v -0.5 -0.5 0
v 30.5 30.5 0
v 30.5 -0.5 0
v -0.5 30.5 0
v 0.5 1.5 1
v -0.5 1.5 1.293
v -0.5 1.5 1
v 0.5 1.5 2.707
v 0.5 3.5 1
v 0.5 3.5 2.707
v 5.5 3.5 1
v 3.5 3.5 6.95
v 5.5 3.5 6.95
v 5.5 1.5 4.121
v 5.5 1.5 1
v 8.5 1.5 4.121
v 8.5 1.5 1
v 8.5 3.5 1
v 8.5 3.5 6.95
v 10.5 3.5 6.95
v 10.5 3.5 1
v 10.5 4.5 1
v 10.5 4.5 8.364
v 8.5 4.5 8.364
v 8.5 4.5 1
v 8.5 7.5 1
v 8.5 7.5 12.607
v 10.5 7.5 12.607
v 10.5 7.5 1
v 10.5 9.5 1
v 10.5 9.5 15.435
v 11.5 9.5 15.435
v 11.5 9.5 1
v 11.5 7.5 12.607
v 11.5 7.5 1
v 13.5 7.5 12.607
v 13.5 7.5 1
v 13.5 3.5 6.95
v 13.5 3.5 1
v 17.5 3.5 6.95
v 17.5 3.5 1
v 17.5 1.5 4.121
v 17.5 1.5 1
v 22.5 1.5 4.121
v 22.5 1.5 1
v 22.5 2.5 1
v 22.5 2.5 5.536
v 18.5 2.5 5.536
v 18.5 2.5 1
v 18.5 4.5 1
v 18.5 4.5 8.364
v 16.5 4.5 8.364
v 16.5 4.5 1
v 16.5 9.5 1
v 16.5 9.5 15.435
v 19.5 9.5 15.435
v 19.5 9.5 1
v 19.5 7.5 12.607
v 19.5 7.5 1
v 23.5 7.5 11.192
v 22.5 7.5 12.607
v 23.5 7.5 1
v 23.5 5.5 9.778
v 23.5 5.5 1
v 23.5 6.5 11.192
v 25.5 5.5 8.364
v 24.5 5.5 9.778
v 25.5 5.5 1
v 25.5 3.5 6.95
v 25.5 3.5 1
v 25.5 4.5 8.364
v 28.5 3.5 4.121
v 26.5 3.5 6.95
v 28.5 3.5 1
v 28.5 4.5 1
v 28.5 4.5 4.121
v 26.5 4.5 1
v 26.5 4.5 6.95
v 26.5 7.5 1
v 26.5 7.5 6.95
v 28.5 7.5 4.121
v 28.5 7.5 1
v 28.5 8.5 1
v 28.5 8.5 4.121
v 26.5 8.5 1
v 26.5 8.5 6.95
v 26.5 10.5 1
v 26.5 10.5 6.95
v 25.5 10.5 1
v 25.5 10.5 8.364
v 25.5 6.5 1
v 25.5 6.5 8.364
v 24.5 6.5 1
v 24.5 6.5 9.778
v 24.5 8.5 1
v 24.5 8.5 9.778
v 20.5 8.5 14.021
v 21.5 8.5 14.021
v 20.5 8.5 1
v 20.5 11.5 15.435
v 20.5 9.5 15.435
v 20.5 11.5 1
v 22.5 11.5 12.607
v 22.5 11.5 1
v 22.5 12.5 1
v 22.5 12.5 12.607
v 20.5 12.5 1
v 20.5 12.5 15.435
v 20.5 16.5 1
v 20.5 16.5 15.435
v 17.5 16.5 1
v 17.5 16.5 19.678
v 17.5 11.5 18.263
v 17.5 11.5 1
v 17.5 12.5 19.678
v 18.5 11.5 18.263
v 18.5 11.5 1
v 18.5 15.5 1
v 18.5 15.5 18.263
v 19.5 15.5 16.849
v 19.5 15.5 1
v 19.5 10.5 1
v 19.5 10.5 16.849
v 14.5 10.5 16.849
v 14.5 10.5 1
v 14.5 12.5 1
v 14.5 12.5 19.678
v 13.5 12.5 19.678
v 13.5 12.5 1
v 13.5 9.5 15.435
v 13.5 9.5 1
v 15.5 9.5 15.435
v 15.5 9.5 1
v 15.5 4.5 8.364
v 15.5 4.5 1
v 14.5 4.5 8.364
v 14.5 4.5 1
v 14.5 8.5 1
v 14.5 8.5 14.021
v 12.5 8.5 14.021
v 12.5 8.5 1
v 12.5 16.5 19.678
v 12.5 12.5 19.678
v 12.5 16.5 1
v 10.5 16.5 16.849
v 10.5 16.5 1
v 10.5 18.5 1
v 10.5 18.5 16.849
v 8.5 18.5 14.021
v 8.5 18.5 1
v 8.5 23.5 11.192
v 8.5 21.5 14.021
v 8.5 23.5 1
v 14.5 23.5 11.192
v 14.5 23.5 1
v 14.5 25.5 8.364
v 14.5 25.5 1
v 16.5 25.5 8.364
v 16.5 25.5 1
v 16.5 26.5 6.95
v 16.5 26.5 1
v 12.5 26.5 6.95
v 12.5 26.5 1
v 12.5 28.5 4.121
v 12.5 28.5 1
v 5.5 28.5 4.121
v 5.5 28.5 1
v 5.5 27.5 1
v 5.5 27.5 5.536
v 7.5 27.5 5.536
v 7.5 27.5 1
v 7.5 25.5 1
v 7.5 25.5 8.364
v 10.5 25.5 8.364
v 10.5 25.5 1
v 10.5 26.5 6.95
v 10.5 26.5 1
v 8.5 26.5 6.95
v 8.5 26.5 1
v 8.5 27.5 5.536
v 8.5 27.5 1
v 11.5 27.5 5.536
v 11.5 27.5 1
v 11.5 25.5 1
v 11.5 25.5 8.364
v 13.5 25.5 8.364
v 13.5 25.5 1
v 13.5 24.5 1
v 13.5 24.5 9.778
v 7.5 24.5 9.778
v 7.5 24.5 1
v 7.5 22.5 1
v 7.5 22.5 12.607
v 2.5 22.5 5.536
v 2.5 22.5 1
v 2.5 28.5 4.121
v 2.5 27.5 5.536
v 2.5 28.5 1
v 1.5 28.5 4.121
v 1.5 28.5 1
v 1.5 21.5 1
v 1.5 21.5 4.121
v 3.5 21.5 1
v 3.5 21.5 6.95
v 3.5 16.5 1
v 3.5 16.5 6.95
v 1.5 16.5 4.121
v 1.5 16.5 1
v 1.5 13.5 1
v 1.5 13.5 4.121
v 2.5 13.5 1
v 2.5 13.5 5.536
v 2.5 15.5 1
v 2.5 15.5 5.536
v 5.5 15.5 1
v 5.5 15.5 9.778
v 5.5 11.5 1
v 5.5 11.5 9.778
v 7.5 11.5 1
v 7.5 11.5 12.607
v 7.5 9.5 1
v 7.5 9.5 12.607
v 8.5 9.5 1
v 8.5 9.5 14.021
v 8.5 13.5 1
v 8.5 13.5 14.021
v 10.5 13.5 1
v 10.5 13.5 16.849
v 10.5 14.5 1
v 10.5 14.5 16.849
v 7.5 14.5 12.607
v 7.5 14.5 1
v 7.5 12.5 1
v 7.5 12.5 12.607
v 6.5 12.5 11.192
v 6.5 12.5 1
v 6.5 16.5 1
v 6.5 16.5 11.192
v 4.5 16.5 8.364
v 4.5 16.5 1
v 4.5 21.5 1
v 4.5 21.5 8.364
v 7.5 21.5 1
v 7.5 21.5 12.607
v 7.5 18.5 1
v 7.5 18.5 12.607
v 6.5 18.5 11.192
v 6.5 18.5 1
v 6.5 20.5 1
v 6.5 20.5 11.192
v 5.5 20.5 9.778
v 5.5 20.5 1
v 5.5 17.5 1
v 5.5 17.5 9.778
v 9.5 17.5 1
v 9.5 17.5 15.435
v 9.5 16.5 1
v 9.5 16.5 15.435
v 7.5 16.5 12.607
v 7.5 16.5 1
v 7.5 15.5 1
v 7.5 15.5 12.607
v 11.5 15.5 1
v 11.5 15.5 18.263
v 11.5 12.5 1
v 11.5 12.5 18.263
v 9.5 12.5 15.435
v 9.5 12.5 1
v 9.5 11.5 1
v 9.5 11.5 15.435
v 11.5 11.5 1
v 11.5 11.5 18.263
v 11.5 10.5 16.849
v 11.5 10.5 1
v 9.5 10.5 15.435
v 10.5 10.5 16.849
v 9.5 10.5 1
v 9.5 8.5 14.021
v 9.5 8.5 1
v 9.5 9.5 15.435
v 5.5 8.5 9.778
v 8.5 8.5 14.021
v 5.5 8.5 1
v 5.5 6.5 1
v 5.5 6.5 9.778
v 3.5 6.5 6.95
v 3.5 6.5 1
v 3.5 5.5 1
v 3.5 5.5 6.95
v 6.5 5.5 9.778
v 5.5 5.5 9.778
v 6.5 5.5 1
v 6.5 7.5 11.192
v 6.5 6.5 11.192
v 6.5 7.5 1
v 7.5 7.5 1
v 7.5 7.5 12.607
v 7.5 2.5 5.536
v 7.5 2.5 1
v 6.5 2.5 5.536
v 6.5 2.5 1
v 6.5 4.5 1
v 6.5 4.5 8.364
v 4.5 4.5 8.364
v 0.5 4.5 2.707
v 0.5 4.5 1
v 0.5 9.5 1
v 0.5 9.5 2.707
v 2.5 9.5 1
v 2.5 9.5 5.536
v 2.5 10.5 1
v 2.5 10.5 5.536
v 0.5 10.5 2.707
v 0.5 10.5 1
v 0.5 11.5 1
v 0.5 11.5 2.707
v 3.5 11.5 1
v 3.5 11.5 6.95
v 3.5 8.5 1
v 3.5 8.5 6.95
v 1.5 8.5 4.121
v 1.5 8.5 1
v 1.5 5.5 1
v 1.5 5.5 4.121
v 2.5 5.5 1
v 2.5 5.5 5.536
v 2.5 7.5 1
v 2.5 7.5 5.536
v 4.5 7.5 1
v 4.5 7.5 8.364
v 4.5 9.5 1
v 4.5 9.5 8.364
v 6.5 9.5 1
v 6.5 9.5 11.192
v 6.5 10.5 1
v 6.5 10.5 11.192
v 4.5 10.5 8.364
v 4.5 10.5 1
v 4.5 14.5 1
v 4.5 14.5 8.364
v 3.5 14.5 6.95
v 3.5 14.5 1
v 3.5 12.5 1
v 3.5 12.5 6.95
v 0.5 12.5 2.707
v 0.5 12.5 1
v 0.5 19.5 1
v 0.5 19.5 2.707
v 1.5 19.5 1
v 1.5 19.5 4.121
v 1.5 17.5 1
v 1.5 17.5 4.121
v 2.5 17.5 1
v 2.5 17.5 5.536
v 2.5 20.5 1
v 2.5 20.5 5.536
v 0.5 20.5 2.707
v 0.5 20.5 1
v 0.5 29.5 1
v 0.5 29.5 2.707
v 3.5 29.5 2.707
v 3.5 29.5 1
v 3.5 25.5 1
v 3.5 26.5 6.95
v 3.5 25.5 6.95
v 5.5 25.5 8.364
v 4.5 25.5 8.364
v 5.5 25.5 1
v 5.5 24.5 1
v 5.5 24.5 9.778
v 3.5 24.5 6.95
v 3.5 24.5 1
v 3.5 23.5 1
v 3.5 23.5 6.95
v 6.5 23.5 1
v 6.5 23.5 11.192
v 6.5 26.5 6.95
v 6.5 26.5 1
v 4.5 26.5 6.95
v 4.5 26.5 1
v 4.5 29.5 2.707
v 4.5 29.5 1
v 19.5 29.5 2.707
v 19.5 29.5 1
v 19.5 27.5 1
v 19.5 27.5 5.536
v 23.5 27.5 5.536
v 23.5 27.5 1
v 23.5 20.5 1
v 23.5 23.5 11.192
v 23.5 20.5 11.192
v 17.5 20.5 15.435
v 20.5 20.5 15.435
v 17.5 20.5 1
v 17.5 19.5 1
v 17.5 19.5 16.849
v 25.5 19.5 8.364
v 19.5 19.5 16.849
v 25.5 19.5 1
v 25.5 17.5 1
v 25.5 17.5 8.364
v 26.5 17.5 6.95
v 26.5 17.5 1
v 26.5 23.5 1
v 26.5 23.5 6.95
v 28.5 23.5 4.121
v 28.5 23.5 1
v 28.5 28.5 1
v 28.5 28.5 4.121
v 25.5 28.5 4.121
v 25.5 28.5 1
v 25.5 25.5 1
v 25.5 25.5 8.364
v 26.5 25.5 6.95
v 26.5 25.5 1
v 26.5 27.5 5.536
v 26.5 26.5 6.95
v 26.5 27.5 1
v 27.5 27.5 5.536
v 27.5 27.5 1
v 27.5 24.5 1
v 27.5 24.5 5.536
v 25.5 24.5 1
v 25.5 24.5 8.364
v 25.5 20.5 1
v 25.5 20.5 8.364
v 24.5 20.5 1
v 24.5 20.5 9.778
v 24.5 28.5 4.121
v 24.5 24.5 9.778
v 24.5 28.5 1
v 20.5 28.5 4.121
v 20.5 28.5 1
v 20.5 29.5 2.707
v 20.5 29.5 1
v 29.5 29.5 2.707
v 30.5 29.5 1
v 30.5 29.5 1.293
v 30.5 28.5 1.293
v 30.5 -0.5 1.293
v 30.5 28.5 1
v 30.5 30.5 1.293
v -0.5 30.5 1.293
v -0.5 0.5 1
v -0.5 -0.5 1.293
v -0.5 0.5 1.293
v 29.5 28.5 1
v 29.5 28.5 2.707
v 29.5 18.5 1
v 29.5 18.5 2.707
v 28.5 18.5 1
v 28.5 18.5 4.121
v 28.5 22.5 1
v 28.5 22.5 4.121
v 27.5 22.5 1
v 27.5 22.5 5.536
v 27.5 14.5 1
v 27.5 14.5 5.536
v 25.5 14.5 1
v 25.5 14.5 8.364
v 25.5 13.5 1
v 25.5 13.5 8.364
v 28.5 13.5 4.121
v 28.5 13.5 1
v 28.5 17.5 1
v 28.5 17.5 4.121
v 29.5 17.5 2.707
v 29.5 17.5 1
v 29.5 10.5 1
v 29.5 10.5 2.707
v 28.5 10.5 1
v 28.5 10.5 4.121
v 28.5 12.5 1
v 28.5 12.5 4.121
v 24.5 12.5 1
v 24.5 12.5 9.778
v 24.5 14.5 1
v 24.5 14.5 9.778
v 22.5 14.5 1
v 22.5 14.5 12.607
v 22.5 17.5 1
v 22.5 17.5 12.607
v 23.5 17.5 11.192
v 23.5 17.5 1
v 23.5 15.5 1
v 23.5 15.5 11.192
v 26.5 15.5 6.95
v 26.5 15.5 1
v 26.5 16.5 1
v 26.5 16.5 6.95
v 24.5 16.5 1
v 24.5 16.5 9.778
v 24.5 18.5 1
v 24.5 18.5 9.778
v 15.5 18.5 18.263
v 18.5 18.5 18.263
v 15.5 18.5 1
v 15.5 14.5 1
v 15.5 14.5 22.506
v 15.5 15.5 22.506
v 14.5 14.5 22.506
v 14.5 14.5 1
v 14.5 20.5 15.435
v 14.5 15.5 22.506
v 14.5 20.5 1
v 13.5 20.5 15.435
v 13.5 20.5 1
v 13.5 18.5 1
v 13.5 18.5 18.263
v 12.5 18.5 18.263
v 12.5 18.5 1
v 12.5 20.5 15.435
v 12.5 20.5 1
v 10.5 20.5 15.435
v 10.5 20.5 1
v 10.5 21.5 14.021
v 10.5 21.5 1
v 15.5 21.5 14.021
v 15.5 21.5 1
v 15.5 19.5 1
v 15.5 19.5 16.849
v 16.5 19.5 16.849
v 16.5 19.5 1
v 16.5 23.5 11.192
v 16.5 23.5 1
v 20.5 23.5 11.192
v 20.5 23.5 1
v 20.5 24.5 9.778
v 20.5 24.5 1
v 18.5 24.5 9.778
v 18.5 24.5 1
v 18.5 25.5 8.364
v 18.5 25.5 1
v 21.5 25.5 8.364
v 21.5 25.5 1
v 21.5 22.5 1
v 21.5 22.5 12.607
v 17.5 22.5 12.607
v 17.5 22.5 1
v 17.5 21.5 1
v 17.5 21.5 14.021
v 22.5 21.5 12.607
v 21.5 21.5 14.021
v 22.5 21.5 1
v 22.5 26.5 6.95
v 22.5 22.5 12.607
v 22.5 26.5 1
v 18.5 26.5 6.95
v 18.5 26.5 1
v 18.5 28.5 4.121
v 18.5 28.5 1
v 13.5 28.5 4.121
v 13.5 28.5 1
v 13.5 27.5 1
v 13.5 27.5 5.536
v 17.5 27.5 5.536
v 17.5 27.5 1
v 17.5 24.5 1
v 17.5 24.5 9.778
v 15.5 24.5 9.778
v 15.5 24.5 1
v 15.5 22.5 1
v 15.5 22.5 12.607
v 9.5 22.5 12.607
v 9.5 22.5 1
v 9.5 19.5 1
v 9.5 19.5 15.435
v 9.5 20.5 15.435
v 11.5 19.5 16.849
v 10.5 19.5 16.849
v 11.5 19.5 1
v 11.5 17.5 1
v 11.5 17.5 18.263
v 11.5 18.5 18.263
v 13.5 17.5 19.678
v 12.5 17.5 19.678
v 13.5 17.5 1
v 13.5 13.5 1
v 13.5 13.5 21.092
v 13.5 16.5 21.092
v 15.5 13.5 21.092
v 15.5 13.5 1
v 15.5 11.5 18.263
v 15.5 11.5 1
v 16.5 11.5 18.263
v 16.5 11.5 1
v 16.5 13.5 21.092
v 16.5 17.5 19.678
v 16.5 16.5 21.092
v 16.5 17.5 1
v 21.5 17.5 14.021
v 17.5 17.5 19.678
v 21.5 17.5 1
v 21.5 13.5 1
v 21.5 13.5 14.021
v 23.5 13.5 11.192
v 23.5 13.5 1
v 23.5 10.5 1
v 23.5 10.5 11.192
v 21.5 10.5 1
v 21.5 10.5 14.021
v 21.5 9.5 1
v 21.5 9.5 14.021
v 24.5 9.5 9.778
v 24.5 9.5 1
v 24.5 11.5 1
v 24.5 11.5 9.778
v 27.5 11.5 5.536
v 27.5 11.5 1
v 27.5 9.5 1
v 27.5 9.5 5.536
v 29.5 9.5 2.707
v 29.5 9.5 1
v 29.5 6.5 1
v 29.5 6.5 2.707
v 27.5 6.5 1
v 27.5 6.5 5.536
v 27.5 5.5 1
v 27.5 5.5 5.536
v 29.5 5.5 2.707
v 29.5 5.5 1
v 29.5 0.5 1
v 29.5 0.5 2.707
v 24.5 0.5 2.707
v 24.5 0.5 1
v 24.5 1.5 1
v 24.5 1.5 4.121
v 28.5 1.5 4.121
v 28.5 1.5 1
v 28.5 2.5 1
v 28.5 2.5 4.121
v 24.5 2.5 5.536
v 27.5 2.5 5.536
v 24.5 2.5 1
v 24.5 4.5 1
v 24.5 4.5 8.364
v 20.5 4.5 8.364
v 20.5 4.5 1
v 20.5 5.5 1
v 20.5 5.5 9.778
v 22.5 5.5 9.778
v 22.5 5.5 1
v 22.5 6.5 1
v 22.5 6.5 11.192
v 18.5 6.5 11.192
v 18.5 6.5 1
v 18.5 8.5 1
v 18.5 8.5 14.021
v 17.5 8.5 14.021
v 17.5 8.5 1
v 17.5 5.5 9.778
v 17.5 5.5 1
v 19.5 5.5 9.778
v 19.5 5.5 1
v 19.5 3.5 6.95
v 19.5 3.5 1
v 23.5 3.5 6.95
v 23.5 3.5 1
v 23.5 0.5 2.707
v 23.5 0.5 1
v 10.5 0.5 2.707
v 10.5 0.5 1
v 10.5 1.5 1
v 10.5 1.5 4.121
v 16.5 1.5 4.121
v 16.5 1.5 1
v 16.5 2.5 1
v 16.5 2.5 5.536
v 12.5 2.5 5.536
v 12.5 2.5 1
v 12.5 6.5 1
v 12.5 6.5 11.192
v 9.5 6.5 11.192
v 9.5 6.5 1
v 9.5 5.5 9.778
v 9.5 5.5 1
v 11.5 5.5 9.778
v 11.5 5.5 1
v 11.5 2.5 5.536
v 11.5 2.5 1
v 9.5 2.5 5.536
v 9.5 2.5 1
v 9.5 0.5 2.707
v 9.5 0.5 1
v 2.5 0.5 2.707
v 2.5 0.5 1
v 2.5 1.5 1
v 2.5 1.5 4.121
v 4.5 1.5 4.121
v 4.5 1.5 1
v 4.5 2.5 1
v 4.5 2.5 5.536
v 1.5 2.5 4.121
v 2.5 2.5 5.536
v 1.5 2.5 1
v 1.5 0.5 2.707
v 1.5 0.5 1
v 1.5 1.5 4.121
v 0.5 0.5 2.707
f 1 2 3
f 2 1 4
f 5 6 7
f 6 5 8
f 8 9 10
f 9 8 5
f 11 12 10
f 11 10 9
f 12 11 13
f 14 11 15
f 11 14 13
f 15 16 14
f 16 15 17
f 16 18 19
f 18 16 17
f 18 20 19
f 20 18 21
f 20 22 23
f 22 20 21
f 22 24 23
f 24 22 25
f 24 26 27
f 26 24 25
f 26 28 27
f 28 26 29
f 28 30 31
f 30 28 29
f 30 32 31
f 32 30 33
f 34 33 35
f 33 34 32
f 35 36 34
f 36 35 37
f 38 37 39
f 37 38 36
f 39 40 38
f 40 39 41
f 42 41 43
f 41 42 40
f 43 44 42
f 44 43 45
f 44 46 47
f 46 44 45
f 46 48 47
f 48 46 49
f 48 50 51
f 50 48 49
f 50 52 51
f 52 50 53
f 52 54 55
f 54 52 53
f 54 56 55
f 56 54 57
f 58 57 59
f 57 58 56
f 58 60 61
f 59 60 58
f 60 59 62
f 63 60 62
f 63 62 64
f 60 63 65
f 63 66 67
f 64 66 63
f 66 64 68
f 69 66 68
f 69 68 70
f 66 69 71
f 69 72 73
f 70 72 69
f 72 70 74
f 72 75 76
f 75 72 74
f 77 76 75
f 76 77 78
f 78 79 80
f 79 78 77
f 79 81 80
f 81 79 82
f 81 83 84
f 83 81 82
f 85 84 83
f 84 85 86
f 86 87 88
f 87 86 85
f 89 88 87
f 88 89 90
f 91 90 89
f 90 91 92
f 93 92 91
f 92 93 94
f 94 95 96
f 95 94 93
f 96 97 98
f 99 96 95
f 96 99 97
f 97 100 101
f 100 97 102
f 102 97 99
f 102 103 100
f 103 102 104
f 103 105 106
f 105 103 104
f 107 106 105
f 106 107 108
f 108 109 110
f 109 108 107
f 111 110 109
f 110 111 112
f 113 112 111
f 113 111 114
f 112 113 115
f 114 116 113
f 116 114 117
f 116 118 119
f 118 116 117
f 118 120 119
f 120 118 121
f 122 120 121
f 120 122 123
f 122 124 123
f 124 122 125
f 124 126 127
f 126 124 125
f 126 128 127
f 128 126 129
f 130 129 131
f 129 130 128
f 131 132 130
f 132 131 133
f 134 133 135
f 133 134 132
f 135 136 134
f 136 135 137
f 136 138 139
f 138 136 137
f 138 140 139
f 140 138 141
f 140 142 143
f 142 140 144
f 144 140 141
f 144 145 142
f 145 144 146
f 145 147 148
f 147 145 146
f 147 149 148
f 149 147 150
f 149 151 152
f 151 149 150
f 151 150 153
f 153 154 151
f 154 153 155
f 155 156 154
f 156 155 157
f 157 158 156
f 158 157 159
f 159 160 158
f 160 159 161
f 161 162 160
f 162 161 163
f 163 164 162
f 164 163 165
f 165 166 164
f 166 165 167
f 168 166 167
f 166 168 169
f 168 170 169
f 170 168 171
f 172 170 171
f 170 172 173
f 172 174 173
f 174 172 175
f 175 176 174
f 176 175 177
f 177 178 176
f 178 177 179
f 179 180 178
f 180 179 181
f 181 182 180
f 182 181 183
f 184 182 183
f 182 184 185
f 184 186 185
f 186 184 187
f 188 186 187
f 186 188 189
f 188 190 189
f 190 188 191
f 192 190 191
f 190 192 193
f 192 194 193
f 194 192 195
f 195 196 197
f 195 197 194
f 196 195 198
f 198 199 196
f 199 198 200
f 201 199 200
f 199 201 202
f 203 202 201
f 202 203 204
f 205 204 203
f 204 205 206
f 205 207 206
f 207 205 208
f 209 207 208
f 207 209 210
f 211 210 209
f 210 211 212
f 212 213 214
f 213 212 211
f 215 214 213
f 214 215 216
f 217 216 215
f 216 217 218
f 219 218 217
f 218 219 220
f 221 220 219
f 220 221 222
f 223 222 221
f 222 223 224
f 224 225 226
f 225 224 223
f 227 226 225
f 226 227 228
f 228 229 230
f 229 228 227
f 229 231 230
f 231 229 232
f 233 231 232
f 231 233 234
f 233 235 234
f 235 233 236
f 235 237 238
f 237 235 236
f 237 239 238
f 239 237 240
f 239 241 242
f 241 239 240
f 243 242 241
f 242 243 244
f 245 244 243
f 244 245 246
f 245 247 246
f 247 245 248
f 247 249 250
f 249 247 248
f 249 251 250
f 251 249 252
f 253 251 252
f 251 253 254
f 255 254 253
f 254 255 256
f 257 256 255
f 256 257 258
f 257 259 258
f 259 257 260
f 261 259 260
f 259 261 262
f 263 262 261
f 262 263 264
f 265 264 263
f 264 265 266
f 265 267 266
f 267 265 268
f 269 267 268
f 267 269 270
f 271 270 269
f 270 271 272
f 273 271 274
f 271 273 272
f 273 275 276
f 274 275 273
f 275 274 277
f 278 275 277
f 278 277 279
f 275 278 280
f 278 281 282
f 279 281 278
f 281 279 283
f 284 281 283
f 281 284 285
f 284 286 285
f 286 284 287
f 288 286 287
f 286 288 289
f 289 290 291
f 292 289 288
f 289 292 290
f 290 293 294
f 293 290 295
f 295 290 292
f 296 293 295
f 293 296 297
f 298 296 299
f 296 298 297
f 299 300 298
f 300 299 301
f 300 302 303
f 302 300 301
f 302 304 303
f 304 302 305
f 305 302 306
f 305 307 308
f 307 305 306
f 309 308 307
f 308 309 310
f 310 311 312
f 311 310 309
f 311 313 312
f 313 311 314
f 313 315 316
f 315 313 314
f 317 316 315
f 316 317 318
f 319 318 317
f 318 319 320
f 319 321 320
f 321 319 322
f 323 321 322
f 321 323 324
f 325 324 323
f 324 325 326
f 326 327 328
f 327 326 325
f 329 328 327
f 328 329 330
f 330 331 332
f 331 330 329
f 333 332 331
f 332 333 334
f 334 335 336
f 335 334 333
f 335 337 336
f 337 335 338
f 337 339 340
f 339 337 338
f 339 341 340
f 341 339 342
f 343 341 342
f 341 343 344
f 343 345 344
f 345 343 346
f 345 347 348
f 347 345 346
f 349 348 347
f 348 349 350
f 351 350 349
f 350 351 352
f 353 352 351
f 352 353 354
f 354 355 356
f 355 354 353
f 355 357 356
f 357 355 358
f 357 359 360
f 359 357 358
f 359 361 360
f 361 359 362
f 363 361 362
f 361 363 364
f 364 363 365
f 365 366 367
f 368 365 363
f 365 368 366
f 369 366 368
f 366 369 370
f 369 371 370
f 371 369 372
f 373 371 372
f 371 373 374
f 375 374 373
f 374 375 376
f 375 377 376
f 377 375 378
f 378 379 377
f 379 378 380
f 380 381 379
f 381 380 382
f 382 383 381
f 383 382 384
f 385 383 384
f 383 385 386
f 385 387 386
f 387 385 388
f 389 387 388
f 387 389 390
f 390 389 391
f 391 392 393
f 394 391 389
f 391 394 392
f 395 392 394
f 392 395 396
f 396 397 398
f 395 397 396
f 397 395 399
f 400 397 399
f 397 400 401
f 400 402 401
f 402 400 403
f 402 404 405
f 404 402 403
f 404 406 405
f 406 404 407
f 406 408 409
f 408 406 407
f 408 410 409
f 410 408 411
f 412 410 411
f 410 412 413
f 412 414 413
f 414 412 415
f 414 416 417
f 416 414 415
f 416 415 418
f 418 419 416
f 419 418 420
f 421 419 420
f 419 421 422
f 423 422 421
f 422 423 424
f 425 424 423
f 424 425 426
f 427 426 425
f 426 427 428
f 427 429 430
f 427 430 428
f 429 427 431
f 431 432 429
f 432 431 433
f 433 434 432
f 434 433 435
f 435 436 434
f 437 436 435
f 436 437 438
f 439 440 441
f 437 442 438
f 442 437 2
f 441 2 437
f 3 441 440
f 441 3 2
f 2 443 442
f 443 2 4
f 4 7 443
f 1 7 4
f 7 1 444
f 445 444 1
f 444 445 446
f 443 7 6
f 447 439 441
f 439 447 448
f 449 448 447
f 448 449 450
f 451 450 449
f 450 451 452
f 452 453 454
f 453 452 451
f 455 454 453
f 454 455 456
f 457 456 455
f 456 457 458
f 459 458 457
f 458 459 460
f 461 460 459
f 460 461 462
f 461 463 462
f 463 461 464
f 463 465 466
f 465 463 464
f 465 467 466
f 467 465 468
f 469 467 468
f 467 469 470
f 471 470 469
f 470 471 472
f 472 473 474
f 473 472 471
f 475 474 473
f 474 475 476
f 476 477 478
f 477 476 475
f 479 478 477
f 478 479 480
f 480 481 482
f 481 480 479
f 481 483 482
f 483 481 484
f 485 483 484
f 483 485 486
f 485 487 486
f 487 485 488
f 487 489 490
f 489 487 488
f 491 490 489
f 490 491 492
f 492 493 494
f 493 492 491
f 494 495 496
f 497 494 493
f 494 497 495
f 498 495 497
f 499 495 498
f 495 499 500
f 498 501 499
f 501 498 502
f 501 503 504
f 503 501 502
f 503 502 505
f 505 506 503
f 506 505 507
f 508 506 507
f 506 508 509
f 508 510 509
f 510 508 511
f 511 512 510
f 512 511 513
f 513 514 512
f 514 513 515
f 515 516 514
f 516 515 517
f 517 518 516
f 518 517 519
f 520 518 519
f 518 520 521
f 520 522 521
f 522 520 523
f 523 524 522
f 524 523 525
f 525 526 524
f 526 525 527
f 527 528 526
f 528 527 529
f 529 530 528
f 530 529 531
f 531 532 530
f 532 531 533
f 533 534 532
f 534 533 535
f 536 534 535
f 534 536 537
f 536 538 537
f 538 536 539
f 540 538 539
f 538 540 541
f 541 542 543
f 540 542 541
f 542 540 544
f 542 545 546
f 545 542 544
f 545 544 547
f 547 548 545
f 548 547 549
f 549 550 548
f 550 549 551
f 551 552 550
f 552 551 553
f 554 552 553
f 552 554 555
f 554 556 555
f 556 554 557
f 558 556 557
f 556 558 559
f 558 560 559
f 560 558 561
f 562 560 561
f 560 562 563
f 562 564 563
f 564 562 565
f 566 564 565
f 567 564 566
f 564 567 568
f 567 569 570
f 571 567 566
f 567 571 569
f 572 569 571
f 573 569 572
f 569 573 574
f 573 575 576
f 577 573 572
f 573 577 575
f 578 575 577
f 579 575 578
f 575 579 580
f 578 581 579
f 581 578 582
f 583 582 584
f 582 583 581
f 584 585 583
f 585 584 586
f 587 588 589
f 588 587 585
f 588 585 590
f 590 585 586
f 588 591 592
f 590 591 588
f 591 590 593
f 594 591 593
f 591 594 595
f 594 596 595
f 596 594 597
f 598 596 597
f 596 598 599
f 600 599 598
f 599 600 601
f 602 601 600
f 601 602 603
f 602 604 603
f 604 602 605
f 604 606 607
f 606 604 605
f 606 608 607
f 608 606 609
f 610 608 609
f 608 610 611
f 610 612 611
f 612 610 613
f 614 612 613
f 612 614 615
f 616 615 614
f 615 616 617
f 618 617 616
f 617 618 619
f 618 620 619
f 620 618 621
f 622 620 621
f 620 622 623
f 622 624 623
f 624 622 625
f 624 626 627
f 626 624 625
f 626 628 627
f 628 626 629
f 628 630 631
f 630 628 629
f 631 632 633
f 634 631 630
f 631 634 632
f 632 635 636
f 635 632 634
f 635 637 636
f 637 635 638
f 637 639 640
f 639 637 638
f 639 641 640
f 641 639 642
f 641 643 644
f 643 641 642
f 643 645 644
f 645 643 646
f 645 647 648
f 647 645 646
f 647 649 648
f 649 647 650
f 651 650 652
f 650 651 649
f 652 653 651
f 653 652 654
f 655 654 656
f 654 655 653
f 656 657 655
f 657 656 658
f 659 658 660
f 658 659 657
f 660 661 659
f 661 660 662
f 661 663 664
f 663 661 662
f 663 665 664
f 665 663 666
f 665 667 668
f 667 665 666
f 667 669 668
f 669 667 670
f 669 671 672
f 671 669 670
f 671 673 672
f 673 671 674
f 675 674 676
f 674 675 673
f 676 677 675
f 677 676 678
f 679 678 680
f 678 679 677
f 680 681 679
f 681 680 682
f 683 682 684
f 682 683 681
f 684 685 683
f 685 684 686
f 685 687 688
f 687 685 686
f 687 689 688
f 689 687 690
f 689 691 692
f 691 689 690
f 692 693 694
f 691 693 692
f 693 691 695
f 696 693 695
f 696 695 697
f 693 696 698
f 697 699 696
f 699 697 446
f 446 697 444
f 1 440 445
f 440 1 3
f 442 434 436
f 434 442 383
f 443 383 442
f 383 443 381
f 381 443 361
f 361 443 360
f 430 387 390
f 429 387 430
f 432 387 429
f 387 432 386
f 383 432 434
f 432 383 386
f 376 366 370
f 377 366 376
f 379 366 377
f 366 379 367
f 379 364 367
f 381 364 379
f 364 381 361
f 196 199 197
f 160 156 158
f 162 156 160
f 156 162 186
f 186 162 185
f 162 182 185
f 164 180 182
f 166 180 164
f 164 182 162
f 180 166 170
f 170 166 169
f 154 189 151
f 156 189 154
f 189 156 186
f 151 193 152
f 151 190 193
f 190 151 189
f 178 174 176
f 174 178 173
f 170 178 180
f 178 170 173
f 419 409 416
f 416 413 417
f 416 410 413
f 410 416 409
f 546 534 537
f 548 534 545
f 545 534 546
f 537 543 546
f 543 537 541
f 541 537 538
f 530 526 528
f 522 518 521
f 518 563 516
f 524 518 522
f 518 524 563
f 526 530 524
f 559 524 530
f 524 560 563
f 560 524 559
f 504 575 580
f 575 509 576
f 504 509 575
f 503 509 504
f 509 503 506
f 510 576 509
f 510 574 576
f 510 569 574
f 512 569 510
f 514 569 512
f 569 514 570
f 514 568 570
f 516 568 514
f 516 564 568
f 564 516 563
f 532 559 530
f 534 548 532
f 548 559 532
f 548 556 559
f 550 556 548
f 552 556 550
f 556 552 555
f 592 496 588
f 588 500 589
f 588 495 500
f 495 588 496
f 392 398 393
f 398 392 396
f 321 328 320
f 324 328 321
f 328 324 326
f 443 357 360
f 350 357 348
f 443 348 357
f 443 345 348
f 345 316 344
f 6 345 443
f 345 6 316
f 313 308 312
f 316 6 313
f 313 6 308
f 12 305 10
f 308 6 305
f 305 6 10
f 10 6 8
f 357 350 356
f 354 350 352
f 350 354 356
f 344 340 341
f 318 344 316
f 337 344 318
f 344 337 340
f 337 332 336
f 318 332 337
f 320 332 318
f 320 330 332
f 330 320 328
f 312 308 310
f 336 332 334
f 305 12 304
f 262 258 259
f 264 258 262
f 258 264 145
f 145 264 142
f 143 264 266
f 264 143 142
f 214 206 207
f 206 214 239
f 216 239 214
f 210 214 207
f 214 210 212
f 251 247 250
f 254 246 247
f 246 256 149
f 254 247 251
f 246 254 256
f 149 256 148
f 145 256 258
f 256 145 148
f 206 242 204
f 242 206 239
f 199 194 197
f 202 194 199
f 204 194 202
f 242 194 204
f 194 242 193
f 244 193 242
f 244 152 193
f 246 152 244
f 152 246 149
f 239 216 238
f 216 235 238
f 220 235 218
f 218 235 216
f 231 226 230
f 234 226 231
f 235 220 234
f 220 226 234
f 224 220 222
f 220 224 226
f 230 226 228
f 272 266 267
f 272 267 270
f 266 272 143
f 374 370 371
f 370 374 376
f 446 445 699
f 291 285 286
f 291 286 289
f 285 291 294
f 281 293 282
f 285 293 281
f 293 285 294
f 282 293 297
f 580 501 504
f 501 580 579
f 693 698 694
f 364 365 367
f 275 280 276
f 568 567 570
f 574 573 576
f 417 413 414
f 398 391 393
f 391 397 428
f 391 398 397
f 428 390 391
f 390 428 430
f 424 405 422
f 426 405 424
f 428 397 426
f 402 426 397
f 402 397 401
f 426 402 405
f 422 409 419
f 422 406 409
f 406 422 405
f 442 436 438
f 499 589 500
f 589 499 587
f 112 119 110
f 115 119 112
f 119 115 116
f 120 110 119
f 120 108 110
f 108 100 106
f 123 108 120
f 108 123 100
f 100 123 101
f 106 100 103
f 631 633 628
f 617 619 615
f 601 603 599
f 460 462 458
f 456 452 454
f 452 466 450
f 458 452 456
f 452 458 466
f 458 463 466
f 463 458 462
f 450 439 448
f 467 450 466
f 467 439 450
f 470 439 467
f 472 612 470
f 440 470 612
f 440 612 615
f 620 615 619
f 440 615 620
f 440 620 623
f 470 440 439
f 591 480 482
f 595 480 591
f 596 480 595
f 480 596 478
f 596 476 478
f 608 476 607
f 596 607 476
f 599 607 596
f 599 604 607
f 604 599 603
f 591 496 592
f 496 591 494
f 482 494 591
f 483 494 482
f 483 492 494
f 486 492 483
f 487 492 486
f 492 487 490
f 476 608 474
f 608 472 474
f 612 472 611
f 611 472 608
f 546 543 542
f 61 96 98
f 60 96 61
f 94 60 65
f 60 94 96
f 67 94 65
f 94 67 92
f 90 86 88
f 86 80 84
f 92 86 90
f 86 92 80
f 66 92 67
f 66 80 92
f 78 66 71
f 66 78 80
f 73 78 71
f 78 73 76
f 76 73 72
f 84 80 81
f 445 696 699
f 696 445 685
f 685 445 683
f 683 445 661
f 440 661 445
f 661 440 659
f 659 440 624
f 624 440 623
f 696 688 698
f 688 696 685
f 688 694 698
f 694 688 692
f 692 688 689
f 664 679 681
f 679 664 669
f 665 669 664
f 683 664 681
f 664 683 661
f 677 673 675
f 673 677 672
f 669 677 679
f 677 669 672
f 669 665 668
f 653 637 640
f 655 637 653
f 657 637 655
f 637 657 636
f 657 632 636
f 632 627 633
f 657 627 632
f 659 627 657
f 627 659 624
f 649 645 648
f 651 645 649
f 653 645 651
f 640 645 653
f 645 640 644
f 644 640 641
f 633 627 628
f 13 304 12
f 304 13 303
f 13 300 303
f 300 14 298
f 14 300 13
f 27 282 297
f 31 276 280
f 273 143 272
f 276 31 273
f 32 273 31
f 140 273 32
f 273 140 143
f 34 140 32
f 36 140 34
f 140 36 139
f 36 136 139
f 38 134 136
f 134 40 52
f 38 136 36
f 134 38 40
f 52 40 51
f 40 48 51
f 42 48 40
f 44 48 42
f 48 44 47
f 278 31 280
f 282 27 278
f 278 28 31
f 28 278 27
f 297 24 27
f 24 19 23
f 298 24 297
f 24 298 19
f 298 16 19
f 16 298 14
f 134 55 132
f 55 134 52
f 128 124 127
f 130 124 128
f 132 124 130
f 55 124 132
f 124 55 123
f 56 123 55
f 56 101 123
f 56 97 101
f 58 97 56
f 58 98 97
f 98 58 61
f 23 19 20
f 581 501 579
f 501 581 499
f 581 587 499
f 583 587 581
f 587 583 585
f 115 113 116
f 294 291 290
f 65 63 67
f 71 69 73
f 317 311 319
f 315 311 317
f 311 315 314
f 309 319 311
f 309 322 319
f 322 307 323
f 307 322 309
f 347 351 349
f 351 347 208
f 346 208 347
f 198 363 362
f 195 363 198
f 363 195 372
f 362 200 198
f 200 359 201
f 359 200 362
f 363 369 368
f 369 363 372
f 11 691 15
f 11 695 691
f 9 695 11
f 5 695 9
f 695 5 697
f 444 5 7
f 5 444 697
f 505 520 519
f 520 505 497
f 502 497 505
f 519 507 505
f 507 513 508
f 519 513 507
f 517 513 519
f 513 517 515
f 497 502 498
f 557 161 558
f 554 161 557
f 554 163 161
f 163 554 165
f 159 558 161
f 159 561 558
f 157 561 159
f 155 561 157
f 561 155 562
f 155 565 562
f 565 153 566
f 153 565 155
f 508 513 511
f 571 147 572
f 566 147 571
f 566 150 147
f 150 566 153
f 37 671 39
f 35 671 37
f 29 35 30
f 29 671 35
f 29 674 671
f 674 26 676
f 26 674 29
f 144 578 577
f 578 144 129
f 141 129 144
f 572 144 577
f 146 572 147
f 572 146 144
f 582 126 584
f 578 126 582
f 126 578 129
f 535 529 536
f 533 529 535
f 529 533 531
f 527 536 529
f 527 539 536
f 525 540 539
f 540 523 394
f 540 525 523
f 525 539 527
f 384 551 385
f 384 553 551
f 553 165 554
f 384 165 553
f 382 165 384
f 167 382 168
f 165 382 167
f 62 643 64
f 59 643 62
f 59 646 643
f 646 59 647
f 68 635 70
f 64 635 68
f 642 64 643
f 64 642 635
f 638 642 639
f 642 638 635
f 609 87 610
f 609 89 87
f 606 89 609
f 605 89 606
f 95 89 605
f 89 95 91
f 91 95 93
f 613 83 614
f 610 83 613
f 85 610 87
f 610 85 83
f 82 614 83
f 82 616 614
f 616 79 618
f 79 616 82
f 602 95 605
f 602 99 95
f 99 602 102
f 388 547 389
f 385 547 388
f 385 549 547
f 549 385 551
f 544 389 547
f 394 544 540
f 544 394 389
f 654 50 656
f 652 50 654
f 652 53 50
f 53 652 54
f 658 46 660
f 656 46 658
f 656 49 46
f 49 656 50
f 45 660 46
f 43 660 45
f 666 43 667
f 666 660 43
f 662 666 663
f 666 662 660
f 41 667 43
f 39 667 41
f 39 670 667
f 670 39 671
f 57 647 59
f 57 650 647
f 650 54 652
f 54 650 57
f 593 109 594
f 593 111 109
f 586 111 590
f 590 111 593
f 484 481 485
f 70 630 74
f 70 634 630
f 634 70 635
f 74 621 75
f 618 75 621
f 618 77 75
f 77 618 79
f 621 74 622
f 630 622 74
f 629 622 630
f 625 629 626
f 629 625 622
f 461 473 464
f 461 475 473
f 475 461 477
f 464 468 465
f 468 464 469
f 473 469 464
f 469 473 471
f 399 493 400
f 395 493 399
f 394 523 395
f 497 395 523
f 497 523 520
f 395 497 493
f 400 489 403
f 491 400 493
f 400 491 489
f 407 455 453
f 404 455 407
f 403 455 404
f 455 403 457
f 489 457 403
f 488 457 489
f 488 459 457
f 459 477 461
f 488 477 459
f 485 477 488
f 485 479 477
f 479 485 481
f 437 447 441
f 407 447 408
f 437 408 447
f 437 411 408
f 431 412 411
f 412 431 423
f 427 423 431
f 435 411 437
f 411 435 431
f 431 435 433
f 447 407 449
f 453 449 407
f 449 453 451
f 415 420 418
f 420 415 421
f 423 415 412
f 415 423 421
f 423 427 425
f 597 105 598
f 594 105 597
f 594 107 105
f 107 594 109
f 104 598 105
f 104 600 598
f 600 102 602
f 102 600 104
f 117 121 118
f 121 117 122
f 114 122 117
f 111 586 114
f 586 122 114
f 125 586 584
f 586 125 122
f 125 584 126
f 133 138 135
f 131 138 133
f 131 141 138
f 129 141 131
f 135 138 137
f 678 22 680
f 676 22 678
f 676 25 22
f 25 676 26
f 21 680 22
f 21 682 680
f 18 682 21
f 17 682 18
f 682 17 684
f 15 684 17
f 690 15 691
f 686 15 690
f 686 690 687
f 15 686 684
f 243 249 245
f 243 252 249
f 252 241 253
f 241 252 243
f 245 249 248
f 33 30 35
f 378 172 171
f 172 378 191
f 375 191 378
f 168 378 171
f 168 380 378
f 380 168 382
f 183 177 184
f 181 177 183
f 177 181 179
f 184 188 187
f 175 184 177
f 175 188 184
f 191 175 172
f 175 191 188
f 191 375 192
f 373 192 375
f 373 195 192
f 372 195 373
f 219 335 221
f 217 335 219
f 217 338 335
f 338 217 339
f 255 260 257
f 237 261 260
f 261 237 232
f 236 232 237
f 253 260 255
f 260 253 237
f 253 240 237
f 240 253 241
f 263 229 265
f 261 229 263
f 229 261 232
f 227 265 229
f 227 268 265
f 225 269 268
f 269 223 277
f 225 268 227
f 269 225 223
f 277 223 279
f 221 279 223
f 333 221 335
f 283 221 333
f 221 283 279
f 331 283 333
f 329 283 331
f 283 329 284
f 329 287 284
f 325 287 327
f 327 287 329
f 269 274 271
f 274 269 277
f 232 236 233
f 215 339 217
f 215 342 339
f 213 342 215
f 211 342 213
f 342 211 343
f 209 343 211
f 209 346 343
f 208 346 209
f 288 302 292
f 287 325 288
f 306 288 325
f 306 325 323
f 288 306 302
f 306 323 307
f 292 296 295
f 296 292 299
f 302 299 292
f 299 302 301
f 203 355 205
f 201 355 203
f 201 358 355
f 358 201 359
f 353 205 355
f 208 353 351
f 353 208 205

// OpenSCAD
// file: random_maze_generator.scad
use <2d.scad>;

rows = 10; 
columns = 10; 
wall_thickness = 2;
wall_height = 5;
block_width = 5;


/*
 * constants, for clearness
 *
 */
 
// random directions, for picking up a direction to visit the next block
function PERMUTATION_OF_FOUR() = [
    [1, 2, 3, 4],
    [1, 2, 4, 3],
    [1, 3, 2, 4],
    [1, 3, 4, 2],
    [1, 4, 2, 3],
    [1, 4, 3, 2],
    [2, 1, 3, 4],
    [2, 1, 4, 3],
    [2, 3, 1, 4],
    [2, 3, 4, 1],
    [2, 4, 1, 3],
    [2, 4, 3, 1],
    [3, 1, 2, 4],
    [3, 1, 4, 2],
    [3, 2, 1, 4],
    [3, 2, 4, 1],
    [3, 4, 1, 2],
    [3, 4, 2, 1],
    [4, 1, 2, 3],
    [4, 1, 3, 2],
    [4, 2, 1, 3],
    [4, 2, 3, 1],
    [4, 3, 1, 2],
    [4, 3, 2, 1]
];

function NO_WALL() = 0;
function UP_WALL() = 1;
function RIGHT_WALL() = 2;
function UP_RIGHT_WALL() = 3;

function NOT_VISITED() = 0;
function VISITED() = 1;

/* 
 * modules for creating a maze
 *
 */

// create the outer wall of maze
module maze_outer_wall(rows, columns, block_width = 5, wall_thickness = 1) {
    x_line([0, rows * block_width], columns * block_width, wall_thickness);
    y_line([0, block_width], (rows - 1) * block_width, wall_thickness);
}

// create the inner wall of maze
module maze_inner_wall(maze, block_width = 5, wall_thickness = 1) {
    for(i = [0:len(maze) - 1]) {
        cord = maze[i];
        x = (cord[0] - 1) * block_width;
        y = (cord[1] - 1) * block_width;
        v = cord[3];
        
        if(v == 1 || v == 3) {
            x_line([x, y], block_width, wall_thickness);
        }
        if(v == 2 || v == 3) {
            y_line([x + block_width, y], block_width, wall_thickness);
        }
    }  
}

// create a maze
module maze(rows, columns, maze_vector, block_width = 5, wall_thickness = 1) {
     maze_outer_wall(rows, columns, block_width, wall_thickness);
     maze_inner_wall(maze_vector, block_width, wall_thickness);
}

/* 
 * utilities functions
 *
 */

// comare the equality of [x1, y1] and [x2, y2]
function cord_equals(cord1, cord2) = cord1 == cord2;

// is the point visited?
function not_visited(cord, vs, index = 0) =
    index == len(vs) ? true : 
        (cord_equals([vs[index][0], vs[index][1]], cord) && vs[index][2] == 1 ? false :
            not_visited(cord, vs, index + 1));
            
// pick a direction randomly
function rand_dirs() =
    PERMUTATION_OF_FOUR()[round(rands(0, 24, 1)[0])]; 

// give a index (exclusivly), slice a vector 
function head_to(i, vs) =
    i >= len(vs) ? vs : (
        i == 0 ? [] : concat(head_to(i - 1, vs), [vs[i - 1]])
    );

// give a index (exclusivly), slice a vector 
function tail_from(i, vs, index = 0, new_vs = []) =
    i >= len(vs) ? [] : (
        index < i ? tail_from(i, vs, index + 1) : (
            index < len(vs) ? tail_from(i, vs, index + 1, concat(new_vs, [vs[index]])) : new_vs
        )
    );

// replace v1 in the vector with v2 
function replace(v1, v2, vs, index = 0) =
    index == len(vs) ? vs : (
        vs[index] == v1 ? concat(concat(head_to(index, vs), [v2]), tail_from(index + 1, vs)) : replace(v1, v2, vs, index + 1)
    );
    
/* 
 * functions for generating a maze vector
 *
 */

// initialize rows of a maze
function init_row(n, length) =
    length == 0 ? [] : concat(init_row(n, length - 1), [[length, n, 0, UP_RIGHT_WALL()]]);
    
// initialize a maze
function init_maze(rows, columns) =
    rows == 0 ? [] : concat(init_maze(rows - 1, columns), init_row(rows, columns));
    
// find a vector in the maze vector
function find(i, j, maze_vector, index = 0) =
    index == len(maze_vector) ? [] : (
        cord_equals([i, j], [maze_vector[index][0], maze_vector[index][1]]) ? maze_vector[index] : find(i, j, maze_vector, index + 1)
    );

////
// NO_WALL = 0;
// UP_WALL = 1;
// RIGHT_WALL = 2;
// UP_RIGHT_WALL = 3;
function delete_right_wall(original_block) = 
    original_block == NO_WALL() || original_block == RIGHT_WALL() ? NO_WALL() : UP_WALL();

function delete_up_wall(original_block) = 
    (original_block == NO_WALL() || original_block == UP_WALL()) ? NO_WALL() : RIGHT_WALL();
    
function delete_right_wall_of(vs, is_visited, maze_vector) =
    replace(vs, [vs[0], vs[1] , is_visited, delete_right_wall(vs[3])] ,maze_vector);

function delete_up_wall_of(vs, is_visited, maze_vector) =
    replace(vs, [vs[0], vs[1] , is_visited, delete_up_wall(vs[3])] ,maze_vector);

function go_right(i, j, rows, columns, maze_vector) =
    go_maze(i + 1, j, rows, columns, delete_right_wall_of(find(i, j, maze_vector), VISITED(), maze_vector));
    
function go_up(i, j, rows, columns, maze_vector) =
    go_maze(i, j - 1, rows, columns, delete_up_wall_of(find(i, j, maze_vector), VISITED(), maze_vector));
    
function visit(v, maze_vector) =
    replace(v, [v[0], v[1], VISITED(), v[3]], maze_vector);
 
function go_left(i, j, rows, columns, maze_vector) =
    go_maze(i - 1, j, rows, columns, delete_right_wall_of(find(i - 1, j, maze_vector), NOT_VISITED(), maze_vector));
    
function go_down(i, j, rows, columns, maze_vector) =
    go_maze(i, j + 1, rows, columns, delete_up_wall_of(find(i, j + 1, maze_vector), NOT_VISITED(), maze_vector));
    
function go_maze(i, j, rows, columns, maze_vector) =
    look_around(i, j, rand_dirs(), rows, columns, visit(find(i, j, maze_vector), maze_vector));
    
function look_around(i, j, dirs, rows, columns, maze_vector, index = 0) =
    index == 4 ? maze_vector : 
        look_around( 
            i, j, dirs, 
            rows, columns, 
            build_wall(i, j, dirs[index], rows, columns, maze_vector), 
            index + 1
        ); 

function build_wall(i, j, n, rows, columns, maze_vector) = 
    n == 1 && i != columns && not_visited([i + 1, j], maze_vector) ? go_right(i, j, rows, columns, maze_vector) : ( 
        n == 2 && j != 1 && not_visited([i, j - 1], maze_vector) ? go_up(i, j, rows, columns, maze_vector)  : (
            n == 3 && i != 1 && not_visited([i - 1, j], maze_vector) ? go_left(i, j,rows, columns,  maze_vector)  : (
                n == 4 && j != rows && not_visited([i, j + 1], maze_vector) ? go_down(i, j, rows, columns, maze_vector) : maze_vector
            ) 
        )
    ); 
 
/*
 * create a maze
 *
 */
maze_vector = go_maze(1, 1, rows, columns, replace([columns, rows, 0, UP_RIGHT_WALL()], [columns, rows, 0, UP_WALL()], init_maze(rows, columns)));
linear_extrude(wall_height) 
    maze(rows, columns, maze_vector, block_width, wall_thickness);
// file: 2d.scad
function PI() = 3.14159;

// give a [x, y] point and length. draw a line in the x direction
module x_line(point, length, thickness = 1) {
    offset = thickness / 2;
    translate([point[0] - offset, point[1] - offset, 0]) 
        square([length + thickness, thickness]);
}

// give a [x, y] point and length. draw a line in the y direction
module y_line(point, length, thickness = 1) {
    offset = thickness / 2;
    translate([point[0] - offset, point[1] - offset, 0])  
        square([thickness, length + thickness]);
}

module a_quarter_arc(radius, angle, width = 1) {
    outer = radius + width;
    intersection() {
        difference() {
            offset(r = width) circle(radius, $fn=96); 
            circle(radius, $fn=96);
        }
        polygon([[0, 0], [outer, 0], [outer, outer * sin(angle)], [outer * cos(angle), outer * sin(angle)]]);
    }
}

module arc(radius, angles, width = 1) {
    angle_from = angles[0];
    angle_to = angles[1];
    angle_difference = angle_to - angle_from;
    outer = radius + width;
    rotate(angle_from)
        if(angle_difference <= 90) {
            a_quarter_arc(radius, angle_difference, width);
        } else if(angle_difference > 90 && angle_difference <= 180) {
            arc(radius, [0, 90], width);
            rotate(90) a_quarter_arc(radius, angle_difference - 90, width);
        } else if(angle_difference > 180 && angle_difference <= 270) {
            arc(radius, [0, 180], width);
            rotate(180) a_quarter_arc(radius, angle_difference - 180, width);
        } else if(angle_difference > 270 && angle_difference <= 360) {
            arc(radius, [0, 270], width);
            rotate(270) a_quarter_arc(radius, angle_difference - 270, width);
       }
}
// main file
square_block = 15; 
wall_thickness = 1;
block_width = 2;

use <2d.scad>;
use <random_maze_generator.scad>;

module maze_pyramid(square_block, block_width = 2, wall_thickness = 1) {

	maze_vector = go_maze(1, 1, square_block, square_block, replace([square_block, square_block, 0, UP_RIGHT_WALL()], [square_block, square_block, 0, UP_WALL()], init_maze(square_block, square_block)));

	diameter = square_block * block_width / 1.4142135623730950488016887242097 + wall_thickness * 2;
	
	half_wall_thickness = wall_thickness / 2;
	
	offset = square_block * block_width / 2;
	
	intersection() {
		linear_extrude(diameter) 
			maze(square_block, square_block, maze_vector, block_width, wall_thickness);

		translate([offset, offset, 0])     
			rotate([0, 0, 45]) 
				cylinder(diameter, diameter, 0, $fn=4);
	}

	translate([-half_wall_thickness, -half_wall_thickness, 0])     
	    linear_extrude(wall_thickness) 
		    square(square_block * block_width + wall_thickness);

}
	
maze_pyramid(square_block, block_width, wall_thickness);
